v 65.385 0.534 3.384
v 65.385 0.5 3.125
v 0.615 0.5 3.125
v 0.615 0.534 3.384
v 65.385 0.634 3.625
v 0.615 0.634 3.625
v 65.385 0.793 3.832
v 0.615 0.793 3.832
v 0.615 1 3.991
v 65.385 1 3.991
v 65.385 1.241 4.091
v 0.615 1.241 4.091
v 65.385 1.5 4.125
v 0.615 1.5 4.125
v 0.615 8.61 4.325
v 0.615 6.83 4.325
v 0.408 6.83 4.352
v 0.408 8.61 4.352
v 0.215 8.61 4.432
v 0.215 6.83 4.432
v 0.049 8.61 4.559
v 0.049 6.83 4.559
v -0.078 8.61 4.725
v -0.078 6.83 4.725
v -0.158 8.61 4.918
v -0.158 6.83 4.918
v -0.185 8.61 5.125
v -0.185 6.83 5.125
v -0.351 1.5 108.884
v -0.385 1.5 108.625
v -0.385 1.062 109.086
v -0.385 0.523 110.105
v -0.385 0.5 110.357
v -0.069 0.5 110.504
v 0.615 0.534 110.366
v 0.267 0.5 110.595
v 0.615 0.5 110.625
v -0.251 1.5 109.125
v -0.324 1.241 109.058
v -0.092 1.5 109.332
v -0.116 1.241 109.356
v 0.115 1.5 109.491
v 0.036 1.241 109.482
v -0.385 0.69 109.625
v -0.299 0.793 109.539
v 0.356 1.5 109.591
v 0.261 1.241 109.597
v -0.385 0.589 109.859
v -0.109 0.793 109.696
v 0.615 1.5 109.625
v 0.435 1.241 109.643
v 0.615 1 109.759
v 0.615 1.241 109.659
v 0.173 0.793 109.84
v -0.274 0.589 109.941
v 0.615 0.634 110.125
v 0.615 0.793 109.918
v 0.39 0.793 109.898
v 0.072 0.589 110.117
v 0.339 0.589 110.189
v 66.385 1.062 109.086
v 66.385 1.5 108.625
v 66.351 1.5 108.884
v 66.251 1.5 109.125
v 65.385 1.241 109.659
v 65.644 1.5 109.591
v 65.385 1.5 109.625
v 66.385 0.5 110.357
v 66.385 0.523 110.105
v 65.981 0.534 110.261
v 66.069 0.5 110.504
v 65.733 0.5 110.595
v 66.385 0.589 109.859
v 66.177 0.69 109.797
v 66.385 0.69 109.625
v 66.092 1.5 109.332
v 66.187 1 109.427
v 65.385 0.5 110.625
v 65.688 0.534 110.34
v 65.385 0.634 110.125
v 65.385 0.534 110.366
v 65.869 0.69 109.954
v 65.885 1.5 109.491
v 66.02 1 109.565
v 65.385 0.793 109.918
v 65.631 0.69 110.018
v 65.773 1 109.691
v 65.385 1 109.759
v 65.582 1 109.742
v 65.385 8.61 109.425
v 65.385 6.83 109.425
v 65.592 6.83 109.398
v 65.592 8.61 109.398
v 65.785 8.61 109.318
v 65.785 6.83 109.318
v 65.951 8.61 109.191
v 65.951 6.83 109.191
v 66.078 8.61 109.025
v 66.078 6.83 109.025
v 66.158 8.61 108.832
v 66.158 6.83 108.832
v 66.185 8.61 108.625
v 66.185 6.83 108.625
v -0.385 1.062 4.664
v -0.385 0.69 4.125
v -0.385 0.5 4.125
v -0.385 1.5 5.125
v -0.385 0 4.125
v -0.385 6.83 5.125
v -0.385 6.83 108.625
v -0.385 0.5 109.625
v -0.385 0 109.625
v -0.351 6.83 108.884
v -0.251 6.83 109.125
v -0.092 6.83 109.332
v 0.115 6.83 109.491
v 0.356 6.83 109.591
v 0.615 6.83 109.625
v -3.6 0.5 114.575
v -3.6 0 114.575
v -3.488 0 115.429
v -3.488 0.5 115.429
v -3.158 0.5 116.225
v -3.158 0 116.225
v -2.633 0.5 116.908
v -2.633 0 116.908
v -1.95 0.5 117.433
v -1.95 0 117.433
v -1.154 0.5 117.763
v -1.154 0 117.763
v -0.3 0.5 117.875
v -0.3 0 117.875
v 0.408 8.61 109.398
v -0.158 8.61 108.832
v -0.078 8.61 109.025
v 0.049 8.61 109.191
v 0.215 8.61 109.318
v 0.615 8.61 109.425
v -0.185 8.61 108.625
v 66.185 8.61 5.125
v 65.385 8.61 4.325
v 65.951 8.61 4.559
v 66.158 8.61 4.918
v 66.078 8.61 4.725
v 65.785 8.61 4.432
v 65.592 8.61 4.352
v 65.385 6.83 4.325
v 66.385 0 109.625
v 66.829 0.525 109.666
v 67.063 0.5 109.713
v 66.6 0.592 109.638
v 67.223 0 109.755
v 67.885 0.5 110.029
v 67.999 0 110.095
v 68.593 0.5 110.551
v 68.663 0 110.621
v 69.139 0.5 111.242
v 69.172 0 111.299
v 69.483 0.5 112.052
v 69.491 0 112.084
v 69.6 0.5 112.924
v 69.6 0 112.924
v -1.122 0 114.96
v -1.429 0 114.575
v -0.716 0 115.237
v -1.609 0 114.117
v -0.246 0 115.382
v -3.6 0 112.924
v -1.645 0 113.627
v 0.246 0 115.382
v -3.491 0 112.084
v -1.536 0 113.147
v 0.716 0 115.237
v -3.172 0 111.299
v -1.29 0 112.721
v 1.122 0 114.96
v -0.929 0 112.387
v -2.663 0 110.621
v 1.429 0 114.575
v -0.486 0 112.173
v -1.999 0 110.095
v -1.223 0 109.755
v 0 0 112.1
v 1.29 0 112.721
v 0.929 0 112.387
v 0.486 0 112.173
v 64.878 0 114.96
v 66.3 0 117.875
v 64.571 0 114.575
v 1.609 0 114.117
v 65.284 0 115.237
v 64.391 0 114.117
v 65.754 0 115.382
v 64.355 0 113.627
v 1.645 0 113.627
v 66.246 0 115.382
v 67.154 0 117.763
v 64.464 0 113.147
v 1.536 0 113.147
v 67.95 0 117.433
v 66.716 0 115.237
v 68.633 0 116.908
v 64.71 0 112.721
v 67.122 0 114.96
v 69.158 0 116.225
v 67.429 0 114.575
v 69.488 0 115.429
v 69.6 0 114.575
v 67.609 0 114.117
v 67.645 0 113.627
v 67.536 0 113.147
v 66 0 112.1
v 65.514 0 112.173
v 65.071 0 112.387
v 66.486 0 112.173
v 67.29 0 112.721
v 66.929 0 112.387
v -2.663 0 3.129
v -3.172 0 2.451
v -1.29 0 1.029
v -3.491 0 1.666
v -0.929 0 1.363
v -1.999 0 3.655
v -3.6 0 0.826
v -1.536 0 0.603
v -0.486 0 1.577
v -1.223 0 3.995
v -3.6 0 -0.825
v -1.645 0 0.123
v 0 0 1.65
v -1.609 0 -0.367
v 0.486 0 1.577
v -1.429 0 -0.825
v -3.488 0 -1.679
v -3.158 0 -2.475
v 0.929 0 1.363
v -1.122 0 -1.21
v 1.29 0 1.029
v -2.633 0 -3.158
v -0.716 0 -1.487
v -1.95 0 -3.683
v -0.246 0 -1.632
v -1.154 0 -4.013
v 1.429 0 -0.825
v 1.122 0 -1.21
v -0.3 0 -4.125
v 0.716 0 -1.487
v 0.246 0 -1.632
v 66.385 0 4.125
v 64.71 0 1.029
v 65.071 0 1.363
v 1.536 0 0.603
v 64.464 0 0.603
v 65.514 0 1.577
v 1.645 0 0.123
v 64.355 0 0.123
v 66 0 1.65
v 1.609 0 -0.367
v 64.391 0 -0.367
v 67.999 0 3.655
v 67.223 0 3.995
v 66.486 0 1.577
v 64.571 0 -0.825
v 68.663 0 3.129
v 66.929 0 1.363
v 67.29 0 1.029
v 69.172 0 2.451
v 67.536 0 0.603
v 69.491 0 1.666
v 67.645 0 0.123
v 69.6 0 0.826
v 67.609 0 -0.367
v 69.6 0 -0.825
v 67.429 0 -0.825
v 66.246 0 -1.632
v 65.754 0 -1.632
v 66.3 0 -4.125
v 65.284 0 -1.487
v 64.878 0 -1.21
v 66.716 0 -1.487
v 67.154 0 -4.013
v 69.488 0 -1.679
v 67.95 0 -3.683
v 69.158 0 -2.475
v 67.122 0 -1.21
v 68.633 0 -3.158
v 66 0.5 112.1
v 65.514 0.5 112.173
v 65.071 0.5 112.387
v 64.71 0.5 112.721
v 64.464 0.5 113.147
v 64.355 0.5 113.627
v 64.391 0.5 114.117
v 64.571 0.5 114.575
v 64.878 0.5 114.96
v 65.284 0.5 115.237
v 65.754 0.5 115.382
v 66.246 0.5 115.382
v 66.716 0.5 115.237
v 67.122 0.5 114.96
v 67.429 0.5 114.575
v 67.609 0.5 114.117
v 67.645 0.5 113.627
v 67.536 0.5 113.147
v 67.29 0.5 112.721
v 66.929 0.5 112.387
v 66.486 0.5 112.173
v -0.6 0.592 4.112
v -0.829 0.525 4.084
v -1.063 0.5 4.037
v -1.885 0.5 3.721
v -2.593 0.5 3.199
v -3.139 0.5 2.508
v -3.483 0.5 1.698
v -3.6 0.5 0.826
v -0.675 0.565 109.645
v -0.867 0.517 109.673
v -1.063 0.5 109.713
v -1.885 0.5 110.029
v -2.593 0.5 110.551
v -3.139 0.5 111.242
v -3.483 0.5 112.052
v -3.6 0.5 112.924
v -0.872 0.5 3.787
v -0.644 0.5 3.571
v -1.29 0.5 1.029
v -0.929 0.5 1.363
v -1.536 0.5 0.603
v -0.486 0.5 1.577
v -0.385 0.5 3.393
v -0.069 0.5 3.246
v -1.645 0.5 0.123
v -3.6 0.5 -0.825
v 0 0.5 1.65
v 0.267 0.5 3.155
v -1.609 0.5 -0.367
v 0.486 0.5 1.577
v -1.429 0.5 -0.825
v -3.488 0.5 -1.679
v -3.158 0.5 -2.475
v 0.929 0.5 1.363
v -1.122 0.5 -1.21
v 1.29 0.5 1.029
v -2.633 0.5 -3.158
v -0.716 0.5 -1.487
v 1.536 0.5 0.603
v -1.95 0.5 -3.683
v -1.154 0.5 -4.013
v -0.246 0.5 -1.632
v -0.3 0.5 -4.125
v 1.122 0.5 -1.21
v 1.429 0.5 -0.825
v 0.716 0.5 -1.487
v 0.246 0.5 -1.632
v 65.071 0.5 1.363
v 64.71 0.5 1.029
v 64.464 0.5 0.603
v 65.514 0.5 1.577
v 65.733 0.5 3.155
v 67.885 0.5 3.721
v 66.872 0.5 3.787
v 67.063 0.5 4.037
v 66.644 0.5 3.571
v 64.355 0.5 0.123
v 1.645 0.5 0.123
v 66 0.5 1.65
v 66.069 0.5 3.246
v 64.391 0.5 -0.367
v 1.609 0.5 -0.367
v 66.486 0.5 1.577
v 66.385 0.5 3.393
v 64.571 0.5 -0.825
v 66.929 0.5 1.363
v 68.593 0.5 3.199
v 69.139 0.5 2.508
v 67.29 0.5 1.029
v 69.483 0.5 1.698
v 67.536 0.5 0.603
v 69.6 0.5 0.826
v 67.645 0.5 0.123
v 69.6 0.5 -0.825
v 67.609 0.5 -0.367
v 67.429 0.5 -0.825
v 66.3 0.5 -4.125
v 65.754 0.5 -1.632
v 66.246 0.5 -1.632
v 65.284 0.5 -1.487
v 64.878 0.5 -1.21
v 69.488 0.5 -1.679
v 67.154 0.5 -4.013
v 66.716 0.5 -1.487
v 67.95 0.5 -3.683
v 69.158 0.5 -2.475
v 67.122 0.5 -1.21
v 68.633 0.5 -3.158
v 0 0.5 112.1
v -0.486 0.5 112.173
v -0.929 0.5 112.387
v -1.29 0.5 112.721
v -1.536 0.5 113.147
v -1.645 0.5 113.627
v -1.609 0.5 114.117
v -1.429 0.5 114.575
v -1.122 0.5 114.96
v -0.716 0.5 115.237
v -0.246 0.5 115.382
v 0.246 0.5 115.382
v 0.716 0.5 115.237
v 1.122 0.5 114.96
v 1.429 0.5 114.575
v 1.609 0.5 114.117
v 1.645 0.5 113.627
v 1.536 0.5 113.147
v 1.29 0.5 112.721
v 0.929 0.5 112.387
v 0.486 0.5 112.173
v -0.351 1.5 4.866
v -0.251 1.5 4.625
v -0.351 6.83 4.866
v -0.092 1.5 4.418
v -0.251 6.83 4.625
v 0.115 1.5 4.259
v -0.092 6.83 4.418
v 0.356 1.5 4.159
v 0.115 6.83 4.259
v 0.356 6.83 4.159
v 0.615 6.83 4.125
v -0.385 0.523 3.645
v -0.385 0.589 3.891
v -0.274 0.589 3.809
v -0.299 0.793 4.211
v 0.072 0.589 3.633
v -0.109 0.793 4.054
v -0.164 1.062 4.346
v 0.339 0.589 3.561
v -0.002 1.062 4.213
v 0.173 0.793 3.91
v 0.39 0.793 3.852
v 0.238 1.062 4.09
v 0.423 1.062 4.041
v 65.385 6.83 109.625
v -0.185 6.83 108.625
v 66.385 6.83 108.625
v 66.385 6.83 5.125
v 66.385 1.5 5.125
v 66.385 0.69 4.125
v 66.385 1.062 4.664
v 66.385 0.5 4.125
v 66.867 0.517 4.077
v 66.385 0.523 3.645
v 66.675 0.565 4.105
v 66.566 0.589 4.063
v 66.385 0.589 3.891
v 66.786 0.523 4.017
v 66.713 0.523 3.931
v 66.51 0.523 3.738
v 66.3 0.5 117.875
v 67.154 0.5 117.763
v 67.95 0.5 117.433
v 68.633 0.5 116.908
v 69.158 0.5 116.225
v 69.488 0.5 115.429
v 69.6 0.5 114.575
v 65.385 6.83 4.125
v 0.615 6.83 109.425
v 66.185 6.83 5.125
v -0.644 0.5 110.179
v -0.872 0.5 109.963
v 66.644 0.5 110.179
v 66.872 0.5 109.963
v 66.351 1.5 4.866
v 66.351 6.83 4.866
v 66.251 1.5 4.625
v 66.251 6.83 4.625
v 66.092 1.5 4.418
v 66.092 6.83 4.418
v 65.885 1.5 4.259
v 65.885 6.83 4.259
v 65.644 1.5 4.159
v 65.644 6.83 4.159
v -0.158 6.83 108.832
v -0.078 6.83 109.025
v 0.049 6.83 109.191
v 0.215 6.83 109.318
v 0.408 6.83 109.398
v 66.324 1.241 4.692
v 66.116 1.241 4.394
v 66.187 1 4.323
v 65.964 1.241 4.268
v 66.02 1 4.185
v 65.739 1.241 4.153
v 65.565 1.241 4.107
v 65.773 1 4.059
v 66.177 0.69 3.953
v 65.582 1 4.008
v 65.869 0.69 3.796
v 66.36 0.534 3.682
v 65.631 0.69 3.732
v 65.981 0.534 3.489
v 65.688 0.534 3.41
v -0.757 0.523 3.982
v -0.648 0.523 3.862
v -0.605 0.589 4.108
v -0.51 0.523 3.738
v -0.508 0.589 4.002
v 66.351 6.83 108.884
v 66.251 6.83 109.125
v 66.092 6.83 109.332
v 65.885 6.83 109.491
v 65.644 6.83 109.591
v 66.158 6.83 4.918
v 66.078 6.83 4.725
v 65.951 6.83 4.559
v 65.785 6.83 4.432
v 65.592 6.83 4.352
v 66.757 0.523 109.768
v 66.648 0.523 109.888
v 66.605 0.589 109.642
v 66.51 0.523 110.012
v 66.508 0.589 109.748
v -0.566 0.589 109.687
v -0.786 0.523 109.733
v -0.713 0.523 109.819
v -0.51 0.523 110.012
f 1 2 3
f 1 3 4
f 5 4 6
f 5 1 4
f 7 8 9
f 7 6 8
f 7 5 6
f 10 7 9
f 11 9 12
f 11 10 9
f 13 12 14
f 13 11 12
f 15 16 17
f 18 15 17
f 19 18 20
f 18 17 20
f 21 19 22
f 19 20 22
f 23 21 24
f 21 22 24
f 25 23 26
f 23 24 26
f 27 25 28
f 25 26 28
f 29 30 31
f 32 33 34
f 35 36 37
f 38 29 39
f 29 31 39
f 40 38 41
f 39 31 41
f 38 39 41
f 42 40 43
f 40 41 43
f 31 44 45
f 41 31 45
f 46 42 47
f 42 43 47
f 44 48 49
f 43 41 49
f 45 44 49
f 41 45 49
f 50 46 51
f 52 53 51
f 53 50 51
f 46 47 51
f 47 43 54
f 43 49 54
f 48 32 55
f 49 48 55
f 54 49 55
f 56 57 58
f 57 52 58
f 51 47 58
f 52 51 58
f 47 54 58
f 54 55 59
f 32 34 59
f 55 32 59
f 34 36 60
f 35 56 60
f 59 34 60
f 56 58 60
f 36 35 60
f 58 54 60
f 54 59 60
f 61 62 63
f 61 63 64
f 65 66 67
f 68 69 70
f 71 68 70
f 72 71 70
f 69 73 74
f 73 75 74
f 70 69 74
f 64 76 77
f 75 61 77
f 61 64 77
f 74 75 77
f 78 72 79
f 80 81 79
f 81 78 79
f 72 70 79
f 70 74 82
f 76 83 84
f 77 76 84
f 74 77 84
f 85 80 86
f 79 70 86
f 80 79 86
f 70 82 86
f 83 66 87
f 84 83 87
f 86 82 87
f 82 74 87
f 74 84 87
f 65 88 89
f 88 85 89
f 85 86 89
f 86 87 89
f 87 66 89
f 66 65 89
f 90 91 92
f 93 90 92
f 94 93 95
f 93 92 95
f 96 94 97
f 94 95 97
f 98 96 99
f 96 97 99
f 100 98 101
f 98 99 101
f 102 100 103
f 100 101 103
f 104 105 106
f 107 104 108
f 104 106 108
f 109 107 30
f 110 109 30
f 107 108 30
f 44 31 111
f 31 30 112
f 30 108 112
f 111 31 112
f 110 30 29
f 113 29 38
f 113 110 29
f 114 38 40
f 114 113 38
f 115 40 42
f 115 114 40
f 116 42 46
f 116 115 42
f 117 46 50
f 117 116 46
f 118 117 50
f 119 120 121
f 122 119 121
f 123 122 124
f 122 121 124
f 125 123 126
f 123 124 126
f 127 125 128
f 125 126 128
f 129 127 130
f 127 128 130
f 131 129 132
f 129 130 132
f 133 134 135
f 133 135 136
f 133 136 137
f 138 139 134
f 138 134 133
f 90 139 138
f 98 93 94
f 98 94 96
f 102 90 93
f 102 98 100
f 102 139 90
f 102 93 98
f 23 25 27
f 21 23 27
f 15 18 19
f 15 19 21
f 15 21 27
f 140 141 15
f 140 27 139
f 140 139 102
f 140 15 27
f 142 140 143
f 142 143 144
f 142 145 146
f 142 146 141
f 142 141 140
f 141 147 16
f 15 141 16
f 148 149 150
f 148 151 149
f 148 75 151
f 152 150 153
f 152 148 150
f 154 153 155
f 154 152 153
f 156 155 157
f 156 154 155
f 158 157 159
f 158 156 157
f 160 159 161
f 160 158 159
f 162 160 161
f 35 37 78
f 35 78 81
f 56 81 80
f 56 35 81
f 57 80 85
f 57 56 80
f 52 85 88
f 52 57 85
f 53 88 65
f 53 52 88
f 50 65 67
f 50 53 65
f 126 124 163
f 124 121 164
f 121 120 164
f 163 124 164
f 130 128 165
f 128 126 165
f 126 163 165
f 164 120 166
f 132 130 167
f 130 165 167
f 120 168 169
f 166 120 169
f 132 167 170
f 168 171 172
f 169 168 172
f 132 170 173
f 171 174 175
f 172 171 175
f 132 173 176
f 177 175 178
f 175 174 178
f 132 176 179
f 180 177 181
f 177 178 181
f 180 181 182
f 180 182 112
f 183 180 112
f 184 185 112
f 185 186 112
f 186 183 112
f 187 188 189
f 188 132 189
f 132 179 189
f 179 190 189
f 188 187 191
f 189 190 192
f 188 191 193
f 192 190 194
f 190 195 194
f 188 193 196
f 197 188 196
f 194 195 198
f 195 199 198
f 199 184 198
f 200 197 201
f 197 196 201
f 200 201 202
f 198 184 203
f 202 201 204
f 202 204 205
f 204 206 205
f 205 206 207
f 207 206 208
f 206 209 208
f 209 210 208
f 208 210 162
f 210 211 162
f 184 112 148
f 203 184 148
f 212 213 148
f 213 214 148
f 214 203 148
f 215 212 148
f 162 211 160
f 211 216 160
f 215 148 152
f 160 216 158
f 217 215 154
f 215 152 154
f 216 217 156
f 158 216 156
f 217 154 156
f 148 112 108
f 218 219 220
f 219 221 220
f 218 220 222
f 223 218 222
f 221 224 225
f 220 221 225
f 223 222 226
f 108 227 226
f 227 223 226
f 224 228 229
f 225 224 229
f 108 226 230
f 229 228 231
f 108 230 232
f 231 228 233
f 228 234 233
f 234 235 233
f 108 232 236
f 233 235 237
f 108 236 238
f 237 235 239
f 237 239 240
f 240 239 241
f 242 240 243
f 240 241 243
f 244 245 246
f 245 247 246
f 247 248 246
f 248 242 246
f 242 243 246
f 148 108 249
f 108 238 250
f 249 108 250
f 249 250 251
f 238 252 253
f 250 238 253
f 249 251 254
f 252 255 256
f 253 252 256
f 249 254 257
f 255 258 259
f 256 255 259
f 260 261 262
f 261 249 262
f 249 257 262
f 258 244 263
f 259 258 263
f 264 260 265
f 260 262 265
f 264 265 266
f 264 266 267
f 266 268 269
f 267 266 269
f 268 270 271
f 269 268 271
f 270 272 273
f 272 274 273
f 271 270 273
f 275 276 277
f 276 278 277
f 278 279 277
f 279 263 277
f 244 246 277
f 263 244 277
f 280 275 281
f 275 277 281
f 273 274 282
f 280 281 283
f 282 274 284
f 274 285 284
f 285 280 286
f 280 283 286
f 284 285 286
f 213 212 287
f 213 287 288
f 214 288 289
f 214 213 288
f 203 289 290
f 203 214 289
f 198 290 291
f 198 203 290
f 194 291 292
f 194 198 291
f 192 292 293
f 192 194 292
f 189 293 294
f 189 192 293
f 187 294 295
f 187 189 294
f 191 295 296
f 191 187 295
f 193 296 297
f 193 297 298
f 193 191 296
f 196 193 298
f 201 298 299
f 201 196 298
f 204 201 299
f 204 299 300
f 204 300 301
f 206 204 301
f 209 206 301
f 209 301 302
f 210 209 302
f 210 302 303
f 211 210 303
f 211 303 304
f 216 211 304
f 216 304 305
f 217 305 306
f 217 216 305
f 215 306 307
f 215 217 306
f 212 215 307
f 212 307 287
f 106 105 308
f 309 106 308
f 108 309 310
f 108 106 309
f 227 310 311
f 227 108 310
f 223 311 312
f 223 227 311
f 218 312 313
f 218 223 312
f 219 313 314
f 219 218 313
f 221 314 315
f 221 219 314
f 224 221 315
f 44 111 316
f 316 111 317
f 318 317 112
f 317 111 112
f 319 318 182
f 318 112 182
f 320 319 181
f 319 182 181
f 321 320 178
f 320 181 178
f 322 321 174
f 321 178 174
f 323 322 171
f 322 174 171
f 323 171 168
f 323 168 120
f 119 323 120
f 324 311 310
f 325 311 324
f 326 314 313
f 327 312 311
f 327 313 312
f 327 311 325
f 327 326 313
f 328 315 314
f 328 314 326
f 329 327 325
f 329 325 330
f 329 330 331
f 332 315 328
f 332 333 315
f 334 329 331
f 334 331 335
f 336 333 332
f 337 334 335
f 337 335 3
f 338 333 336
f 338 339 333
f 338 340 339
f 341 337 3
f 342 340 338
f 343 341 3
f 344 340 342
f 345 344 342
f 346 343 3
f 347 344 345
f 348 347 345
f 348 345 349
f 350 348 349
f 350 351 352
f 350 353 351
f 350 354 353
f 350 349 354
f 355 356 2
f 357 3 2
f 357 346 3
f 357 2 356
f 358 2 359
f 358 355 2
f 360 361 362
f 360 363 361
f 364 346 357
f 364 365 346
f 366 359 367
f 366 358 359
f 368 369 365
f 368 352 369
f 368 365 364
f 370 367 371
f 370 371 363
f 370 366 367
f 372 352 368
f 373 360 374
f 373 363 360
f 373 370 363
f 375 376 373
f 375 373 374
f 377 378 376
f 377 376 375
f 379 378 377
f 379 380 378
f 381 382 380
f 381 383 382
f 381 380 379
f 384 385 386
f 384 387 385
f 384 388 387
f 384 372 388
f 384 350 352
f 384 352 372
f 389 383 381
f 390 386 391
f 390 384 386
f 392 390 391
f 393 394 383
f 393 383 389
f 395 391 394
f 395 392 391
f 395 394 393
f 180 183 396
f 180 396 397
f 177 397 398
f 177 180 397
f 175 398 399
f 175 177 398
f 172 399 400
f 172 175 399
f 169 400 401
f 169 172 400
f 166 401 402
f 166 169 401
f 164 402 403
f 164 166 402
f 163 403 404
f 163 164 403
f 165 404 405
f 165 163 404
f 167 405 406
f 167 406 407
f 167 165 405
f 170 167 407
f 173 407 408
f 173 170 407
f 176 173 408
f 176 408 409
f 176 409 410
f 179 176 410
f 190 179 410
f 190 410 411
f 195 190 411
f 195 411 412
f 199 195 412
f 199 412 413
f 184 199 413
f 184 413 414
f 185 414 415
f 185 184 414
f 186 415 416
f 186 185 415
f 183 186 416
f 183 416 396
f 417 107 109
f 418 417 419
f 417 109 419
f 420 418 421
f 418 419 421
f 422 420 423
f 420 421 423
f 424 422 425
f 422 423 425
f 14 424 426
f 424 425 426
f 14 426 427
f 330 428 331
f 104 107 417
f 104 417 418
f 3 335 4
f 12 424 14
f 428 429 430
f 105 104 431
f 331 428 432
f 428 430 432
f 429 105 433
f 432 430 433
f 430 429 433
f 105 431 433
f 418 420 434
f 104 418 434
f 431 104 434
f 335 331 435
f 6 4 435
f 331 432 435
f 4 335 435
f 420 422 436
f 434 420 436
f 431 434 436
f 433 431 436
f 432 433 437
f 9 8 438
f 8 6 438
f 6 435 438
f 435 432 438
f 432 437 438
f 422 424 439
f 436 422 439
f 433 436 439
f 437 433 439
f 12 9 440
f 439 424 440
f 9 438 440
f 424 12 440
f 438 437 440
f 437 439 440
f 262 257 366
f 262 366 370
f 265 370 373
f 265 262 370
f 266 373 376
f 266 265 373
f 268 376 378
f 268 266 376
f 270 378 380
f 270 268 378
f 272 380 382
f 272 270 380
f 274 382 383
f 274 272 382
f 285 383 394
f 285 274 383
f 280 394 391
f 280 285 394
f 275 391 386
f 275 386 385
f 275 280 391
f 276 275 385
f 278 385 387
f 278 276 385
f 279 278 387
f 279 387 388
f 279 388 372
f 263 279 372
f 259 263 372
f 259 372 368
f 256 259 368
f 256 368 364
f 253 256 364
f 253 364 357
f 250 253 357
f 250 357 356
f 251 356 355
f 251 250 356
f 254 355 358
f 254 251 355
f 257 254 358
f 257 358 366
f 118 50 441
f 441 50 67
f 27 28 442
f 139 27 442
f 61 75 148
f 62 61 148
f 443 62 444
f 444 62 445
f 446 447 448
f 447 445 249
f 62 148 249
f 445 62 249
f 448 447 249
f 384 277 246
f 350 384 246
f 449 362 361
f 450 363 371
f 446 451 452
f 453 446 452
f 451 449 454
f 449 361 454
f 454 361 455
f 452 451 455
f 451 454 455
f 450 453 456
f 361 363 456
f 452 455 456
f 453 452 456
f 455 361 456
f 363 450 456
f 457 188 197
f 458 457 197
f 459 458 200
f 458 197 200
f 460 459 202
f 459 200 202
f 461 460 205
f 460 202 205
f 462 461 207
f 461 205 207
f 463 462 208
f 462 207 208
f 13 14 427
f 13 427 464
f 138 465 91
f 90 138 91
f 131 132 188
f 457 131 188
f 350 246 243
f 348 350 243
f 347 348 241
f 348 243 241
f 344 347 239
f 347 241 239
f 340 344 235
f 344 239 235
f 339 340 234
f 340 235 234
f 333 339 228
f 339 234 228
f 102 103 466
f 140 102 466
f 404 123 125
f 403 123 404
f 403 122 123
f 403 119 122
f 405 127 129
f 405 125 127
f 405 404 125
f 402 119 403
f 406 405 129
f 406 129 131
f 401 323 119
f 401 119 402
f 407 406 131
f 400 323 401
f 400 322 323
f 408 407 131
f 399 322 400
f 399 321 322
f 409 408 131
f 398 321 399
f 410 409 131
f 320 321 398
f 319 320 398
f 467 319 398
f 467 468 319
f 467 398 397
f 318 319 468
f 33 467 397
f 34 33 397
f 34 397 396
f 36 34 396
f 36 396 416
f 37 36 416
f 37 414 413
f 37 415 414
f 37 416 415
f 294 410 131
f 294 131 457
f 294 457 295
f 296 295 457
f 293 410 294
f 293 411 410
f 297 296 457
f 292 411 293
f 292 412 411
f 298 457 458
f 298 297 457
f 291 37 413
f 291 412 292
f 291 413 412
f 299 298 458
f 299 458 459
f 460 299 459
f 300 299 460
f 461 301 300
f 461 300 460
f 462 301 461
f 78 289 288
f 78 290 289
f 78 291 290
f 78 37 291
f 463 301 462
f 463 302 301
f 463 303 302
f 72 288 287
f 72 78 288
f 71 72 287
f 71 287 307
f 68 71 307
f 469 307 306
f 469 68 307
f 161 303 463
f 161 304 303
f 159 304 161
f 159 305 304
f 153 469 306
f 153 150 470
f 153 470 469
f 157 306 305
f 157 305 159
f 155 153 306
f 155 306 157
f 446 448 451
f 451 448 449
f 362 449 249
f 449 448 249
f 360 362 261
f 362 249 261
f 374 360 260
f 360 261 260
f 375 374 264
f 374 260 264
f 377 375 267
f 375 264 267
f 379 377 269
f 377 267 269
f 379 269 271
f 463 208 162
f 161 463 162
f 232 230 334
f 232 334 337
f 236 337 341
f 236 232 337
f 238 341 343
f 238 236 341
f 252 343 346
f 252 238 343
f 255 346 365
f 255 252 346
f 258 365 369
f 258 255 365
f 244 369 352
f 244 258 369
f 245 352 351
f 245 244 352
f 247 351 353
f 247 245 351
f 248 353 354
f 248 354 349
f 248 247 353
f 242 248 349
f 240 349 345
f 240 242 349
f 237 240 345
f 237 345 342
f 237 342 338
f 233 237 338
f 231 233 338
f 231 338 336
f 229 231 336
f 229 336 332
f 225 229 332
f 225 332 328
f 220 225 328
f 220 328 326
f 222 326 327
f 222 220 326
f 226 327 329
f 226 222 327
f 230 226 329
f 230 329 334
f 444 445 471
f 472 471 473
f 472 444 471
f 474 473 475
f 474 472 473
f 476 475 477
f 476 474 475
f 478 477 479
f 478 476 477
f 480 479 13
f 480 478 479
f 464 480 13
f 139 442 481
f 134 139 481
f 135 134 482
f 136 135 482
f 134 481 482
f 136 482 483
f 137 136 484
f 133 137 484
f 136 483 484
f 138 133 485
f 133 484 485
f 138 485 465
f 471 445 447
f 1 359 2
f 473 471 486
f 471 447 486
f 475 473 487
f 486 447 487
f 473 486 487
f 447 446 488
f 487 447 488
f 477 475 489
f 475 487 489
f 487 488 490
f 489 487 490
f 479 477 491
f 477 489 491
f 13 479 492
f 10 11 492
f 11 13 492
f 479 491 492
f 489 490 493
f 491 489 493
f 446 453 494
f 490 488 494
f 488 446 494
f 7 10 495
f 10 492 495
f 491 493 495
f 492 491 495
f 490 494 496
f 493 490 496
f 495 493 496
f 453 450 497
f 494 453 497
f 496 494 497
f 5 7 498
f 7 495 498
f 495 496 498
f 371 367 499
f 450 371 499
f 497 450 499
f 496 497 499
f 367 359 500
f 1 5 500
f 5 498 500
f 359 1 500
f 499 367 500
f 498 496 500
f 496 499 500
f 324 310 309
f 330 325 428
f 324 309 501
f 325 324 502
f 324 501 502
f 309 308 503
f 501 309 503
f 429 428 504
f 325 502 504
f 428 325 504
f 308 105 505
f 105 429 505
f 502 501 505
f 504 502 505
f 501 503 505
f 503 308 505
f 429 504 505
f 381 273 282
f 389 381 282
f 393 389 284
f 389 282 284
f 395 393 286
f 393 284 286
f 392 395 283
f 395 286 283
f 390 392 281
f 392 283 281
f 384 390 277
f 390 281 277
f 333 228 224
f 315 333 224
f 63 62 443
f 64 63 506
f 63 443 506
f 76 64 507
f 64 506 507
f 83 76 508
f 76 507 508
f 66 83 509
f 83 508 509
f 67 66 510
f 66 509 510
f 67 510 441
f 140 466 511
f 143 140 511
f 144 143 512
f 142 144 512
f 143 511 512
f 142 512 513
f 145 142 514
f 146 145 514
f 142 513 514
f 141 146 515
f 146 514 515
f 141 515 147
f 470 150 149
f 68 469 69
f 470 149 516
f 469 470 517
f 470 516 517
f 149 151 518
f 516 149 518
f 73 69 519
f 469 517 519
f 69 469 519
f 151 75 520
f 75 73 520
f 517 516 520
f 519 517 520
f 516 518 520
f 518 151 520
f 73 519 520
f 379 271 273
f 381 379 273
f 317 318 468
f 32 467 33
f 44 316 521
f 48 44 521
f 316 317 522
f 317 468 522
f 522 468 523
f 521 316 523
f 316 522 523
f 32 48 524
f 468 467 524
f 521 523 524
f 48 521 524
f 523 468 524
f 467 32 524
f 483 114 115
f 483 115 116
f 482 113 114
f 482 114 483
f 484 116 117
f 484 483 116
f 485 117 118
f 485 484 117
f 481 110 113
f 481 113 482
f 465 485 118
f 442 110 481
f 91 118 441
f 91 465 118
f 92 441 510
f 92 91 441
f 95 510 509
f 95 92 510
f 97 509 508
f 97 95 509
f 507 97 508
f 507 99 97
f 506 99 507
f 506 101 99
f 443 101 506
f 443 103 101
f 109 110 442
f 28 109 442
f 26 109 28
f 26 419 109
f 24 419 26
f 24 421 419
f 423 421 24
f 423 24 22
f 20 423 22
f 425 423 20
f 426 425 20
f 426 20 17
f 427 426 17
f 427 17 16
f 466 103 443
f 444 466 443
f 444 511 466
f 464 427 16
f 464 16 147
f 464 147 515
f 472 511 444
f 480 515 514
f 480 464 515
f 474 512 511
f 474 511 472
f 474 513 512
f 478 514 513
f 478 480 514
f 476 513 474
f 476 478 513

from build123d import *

# Parameters (mm, degrees)
SKETCH_1_R      = 1.65
EXTRUDE_1_DEPTH = 0.5
FILLET_1_R      = 3.3
SKETCH_2_W      = 66.770552446
SKETCH_2_H      = 105.5
EXTRUDE_2_DEPTH = 6.83
FILLET_2_R      = 1
EXTRUDE_3_DEPTH = 1.78
FILLET_3_R      = 1


with BuildPart() as part:
    # 草图1 → 凸台-拉伸1 (new body)
    with BuildSketch(Plane(origin=(0, 0, 0), x_dir=(1, 0, 0), z_dir=(0, 1, 0))):
        Polygon((66.385276223, -4.125), (69.6, -4.125), (69.6, 4.125), (-3.6, 4.125), (-3.6, -4.125), (-0.385276223, -4.125), (-0.385276223, -109.625), (-3.6, -109.625), (-3.6, -117.875), (69.6, -117.875), (69.6, -109.625), (66.385276223, -109.625), align=None)
        with Locations(Location((0, 0, 0), (0, 0, 270))):
            Circle(SKETCH_1_R, mode=Mode.SUBTRACT)
        with Locations(Location((66, 0, 0), (0, 0, 270))):
            Circle(SKETCH_1_R, mode=Mode.SUBTRACT)
        with Locations(Location((66, -113.75, 0), (0, 0, 90))):
            Circle(SKETCH_1_R, mode=Mode.SUBTRACT)
        with Locations(Location((0, -113.75, 0), (0, 0, 90))):
            Circle(SKETCH_1_R, mode=Mode.SUBTRACT)
    extrude(amount=EXTRUDE_1_DEPTH)

    # 圆角1
    # the kernel refuses this fillet: 3.3 mm, written as the material it takes off along each edge
    with BuildSketch(Plane(origin=(69.6, -8.247244982, 109.625), x_dir=(0, 0, 1), z_dir=(0, 1, 0)), Plane(origin=(-3.6, -8.247244982, 4.125), x_dir=(0, 0, -1), z_dir=(0, 1, 0))) as fillet_1_piece_1:
        with BuildLine():
            CenterArc((3.298897993, -3.3), FILLET_1_R, 90, 88.519238897)
            Line((0, -3.214723777), (-0.06597796, -3.213018252))
            ThreePointArc((-0.06597796, -3.213018252), (-0.066, -1.607361888), (-0.066, 0))
            Line((-0.066, 0), (0, 0.066))
            Line((0, 0.066), (3.298897993, 0.066))
            Line((3.298897993, 0.066), (3.298897993, 0))
        make_face()
    extrude(amount=16.994489963, mode=Mode.SUBTRACT)
    with BuildSketch(Plane(origin=(69.6, -8.25, 117.875), x_dir=(-1, 0, 0), z_dir=(0, 1, 0)), Plane(origin=(-3.6, -8.25, 117.875), x_dir=(0, 0, -1), z_dir=(0, 1, 0)), Plane(origin=(-3.6, -8.25, -4.125), x_dir=(1, 0, 0), z_dir=(0, 1, 0)), Plane(origin=(69.6, -8.25, -4.125), x_dir=(0, 0, 1), z_dir=(0, 1, 0))) as fillet_1_piece_2:
        with BuildLine():
            CenterArc((FILLET_1_R, -FILLET_1_R), FILLET_1_R, 90, 90)
            Line((0, -FILLET_1_R), (-FILLET_1_R * 0.02, -FILLET_1_R))
            Line((-FILLET_1_R * 0.02, -FILLET_1_R), (-FILLET_1_R * 0.02, FILLET_1_R * 0.02))
            Line((-FILLET_1_R * 0.02, FILLET_1_R * 0.02), (FILLET_1_R, FILLET_1_R * 0.02))
            Line((FILLET_1_R, FILLET_1_R * 0.02), (FILLET_1_R, 0))
        make_face()
    extrude(amount=17, mode=Mode.SUBTRACT)
    with BuildSketch(Plane(origin=(-3.6, -8.247244982, 109.625), x_dir=(1, 0, 0), z_dir=(0, 1, 0)), Plane(origin=(69.6, -8.247244982, 4.125), x_dir=(-1, 0, 0), z_dir=(0, 1, 0))) as fillet_1_piece_3:
        with BuildLine():
            CenterArc((3.3, -3.298897993), FILLET_1_R, 91.480761103, 88.519238897)
            Line((0, -3.298897993), (-0.066, -3.298897993))
            Line((-0.066, -3.298897993), (-0.066, 0))
            Line((-0.066, 0), (0, 0.066))
            ThreePointArc((0, 0.066), (1.607361888, 0.066), (3.213018252, 0.06597796))
            Line((3.213018252, 0.06597796), (3.214723777, 0))
        make_face()
    extrude(amount=16.994489963, mode=Mode.SUBTRACT)

    # 草图2 → 凸台-拉伸2 (add)
    with BuildSketch(Plane(origin=(0, 0, 0), x_dir=(1, 0, 0), z_dir=(0, 1, 0))):
        with Locations((33, -56.875)):
            Rectangle(SKETCH_2_W, SKETCH_2_H)
    extrude(amount=EXTRUDE_2_DEPTH)

    # 圆角2
    fillet_2_edges = [part.edges().sort_by_distance(p)[0] for p in [
        (-0.385276223, 3.665, 4.125),
        (-0.385276223, 3.665, 109.625),
        (66.385276223, 3.665, 109.625),
        (66.385276223, 3.665, 4.125),
    ]]
    fillet(fillet_2_edges, radius=FILLET_2_R)

    # 草图3 → 凸台-拉伸3 (add)
    with BuildSketch(Plane(origin=(0, 6.83, 0), x_dir=(1, 0, 0), z_dir=(0, 1, 0))):
        with BuildLine():
            Line((66.185276223, -108.625), (66.185276223, -5.125))
            ThreePointArc((66.185276223, -5.125), (65.950961648, -4.559314575), (65.385276223, -4.325))
            Line((65.385276223, -4.325), (0.614723777, -4.325))
            ThreePointArc((0.614723777, -4.325), (0.049038352, -4.559314575), (-0.185276223, -5.125))
            Line((-0.185276223, -5.125), (-0.185276223, -108.625))
            ThreePointArc((-0.185276223, -108.625), (0.049038352, -109.190685425), (0.614723777, -109.425))
            Line((0.614723777, -109.425), (65.385276223, -109.425))
            ThreePointArc((65.385276223, -109.425), (65.950961648, -109.190685425), (66.185276223, -108.625))
        make_face()
    extrude(amount=EXTRUDE_3_DEPTH)

    # 圆角3
    # the kernel refuses this fillet: 1 mm, written as the material it adds along each edge
    with BuildSketch(Plane(origin=(65.385276223, 0.5, 108.625), x_dir=(-0.8017442392976621, 0, -0.5976672776328089), z_dir=(-0.5976672776328089, 0, 0.8017442392976621))) as fillet_3_piece_1_section:
        with BuildLine():
            CenterArc((1 + FILLET_3_R, -FILLET_3_R), FILLET_3_R, 90, 90)
            Line((1 + FILLET_3_R, 0), (1, 0))
            Line((1, 0), (1, -FILLET_3_R))
        make_face()
    fillet_3_piece_1 = revolve(axis=Axis((65.385276223, 0.5, 108.625), (0, -1, 0)), revolution_arc=233.296989237, mode=Mode.PRIVATE)
    fillet_3_piece_1 = split(fillet_3_piece_1, bisect_by=Plane(origin=(66.385276223, 0.811675846, 109.374877518), z_dir=(-1, 0, 0)), keep=Keep.TOP, mode=Mode.PRIVATE)
    add(fillet_3_piece_1)
    with BuildSketch(Plane(origin=(65.385276223, 0.5, 108.625), x_dir=(-0.8017442392976621, 0, -0.5976672776328089), z_dir=(-0.5976672776328089, 0, 0.8017442392976621))) as fillet_3_piece_2_section:
        with BuildLine():
            CenterArc((1 + FILLET_3_R, -FILLET_3_R), FILLET_3_R, 90, 90)
            Line((1 + FILLET_3_R, 0), (1, 0))
            Line((1, 0), (1, -FILLET_3_R))
        make_face()
    fillet_3_piece_2 = revolve(axis=Axis((65.385276223, 0.5, 108.625), (0, -1, 0)), revolution_arc=233.296989237, mode=Mode.PRIVATE)
    fillet_3_piece_2 = fillet_3_piece_2 & Plane(origin=(66.3, 0.537437966, 112.923897993), x_dir=(0, 0, 1), z_dir=(0, -1, 0)) * Cylinder(3.3, 8, mode=Mode.PRIVATE)
    add(fillet_3_piece_2)
    with BuildSketch(Plane(origin=(0.614723777, 0.5, 108.625), x_dir=(0.8017442392976509, 0, -0.597667277632824), z_dir=(0.597667277632824, 0, 0.8017442392976509))) as fillet_3_piece_3_section:
        with BuildLine():
            CenterArc((1 + FILLET_3_R, FILLET_3_R), FILLET_3_R, 180, 90)
            Line((1, FILLET_3_R), (1, 0))
            Line((1, 0), (1 + FILLET_3_R, 0))
        make_face()
    fillet_3_piece_3 = revolve(axis=Axis((0.614723777, 0.5, 108.625), (0, 1, 0)), revolution_arc=233.296989237, mode=Mode.PRIVATE)
    fillet_3_piece_3 = split(fillet_3_piece_3, bisect_by=Plane(origin=(-0.385276223, 0.811675592, 109.374877608), z_dir=(1, 0, 0)), keep=Keep.TOP, mode=Mode.PRIVATE)
    add(fillet_3_piece_3)
    with BuildSketch(Plane(origin=(0.614723777, 0.5, 108.625), x_dir=(0.8017442392976509, 0, -0.597667277632824), z_dir=(0.597667277632824, 0, 0.8017442392976509))) as fillet_3_piece_4_section:
        with BuildLine():
            CenterArc((1 + FILLET_3_R, FILLET_3_R), FILLET_3_R, 180, 90)
            Line((1, FILLET_3_R), (1, 0))
            Line((1, 0), (1 + FILLET_3_R, 0))
        make_face()
    fillet_3_piece_4 = revolve(axis=Axis((0.614723777, 0.5, 108.625), (0, 1, 0)), revolution_arc=233.296989237, mode=Mode.PRIVATE)
    fillet_3_piece_4 = fillet_3_piece_4 & Plane(origin=(-0.3, 0.537437971, 112.923897993), x_dir=(1, 0, 0), z_dir=(0, -1, 0)) * Cylinder(3.3, 8, mode=Mode.PRIVATE)
    add(fillet_3_piece_4)
    with BuildSketch(Plane(origin=(0.614723777, 0.5, 5.125), x_dir=(0.8017442392976485, 0, 0.5976672776328273), z_dir=(0.5976672776328273, 0, -0.8017442392976485))) as fillet_3_piece_5_section:
        with BuildLine():
            CenterArc((1 + FILLET_3_R, -FILLET_3_R), FILLET_3_R, 90, 90)
            Line((1, -FILLET_3_R), (1, 0))
            Line((1, 0), (1 + FILLET_3_R, 0))
        make_face()
    fillet_3_piece_5 = revolve(axis=Axis((0.614723777, 0.5, 5.125), (0, -1, 0)), revolution_arc=233.296989237, mode=Mode.PRIVATE)
    fillet_3_piece_5 = split(fillet_3_piece_5, bisect_by=Plane(origin=(-0.385276223, 0.811675846, 4.375122482), z_dir=(1, 0, 0)), keep=Keep.TOP, mode=Mode.PRIVATE)
    add(fillet_3_piece_5)
    with BuildSketch(Plane(origin=(0.614723777, 0.5, 5.125), x_dir=(0.8017442392976485, 0, 0.5976672776328273), z_dir=(0.5976672776328273, 0, -0.8017442392976485))) as fillet_3_piece_6_section:
        with BuildLine():
            CenterArc((1 + FILLET_3_R, -FILLET_3_R), FILLET_3_R, 90, 90)
            Line((1, -FILLET_3_R), (1, 0))
            Line((1, 0), (1 + FILLET_3_R, 0))
        make_face()
    fillet_3_piece_6 = revolve(axis=Axis((0.614723777, 0.5, 5.125), (0, -1, 0)), revolution_arc=233.296989237, mode=Mode.PRIVATE)
    fillet_3_piece_6 = fillet_3_piece_6 & Plane(origin=(-0.3, 0.537437966, 0.826102007), x_dir=(0, 0, -1), z_dir=(0, -1, 0)) * Cylinder(3.3, 8, mode=Mode.PRIVATE)
    add(fillet_3_piece_6)
    with BuildSketch(Plane(origin=(65.385276223, 0.5, 5.125), x_dir=(-0.801744239297651, 0, 0.5976672776328237), z_dir=(-0.5976672776328237, 0, -0.801744239297651))) as fillet_3_piece_7_section:
        with BuildLine():
            CenterArc((1 + FILLET_3_R, FILLET_3_R), FILLET_3_R, 180, 90)
            Line((1 + FILLET_3_R, 0), (1, 0))
            Line((1, 0), (1, FILLET_3_R))
        make_face()
    fillet_3_piece_7 = revolve(axis=Axis((65.385276223, 0.5, 5.125), (0, 1, 0)), revolution_arc=233.296989237, mode=Mode.PRIVATE)
    fillet_3_piece_7 = split(fillet_3_piece_7, bisect_by=Plane(origin=(66.385276223, 0.811675555, 4.375122379), z_dir=(-1, 0, 0)), keep=Keep.TOP, mode=Mode.PRIVATE)
    add(fillet_3_piece_7)
    with BuildSketch(Plane(origin=(65.385276223, 0.5, 5.125), x_dir=(-0.801744239297651, 0, 0.5976672776328237), z_dir=(-0.5976672776328237, 0, -0.801744239297651))) as fillet_3_piece_8_section:
        with BuildLine():
            CenterArc((1 + FILLET_3_R, FILLET_3_R), FILLET_3_R, 180, 90)
            Line((1 + FILLET_3_R, 0), (1, 0))
            Line((1, 0), (1, FILLET_3_R))
        make_face()
    fillet_3_piece_8 = revolve(axis=Axis((65.385276223, 0.5, 5.125), (0, 1, 0)), revolution_arc=233.296989237, mode=Mode.PRIVATE)
    fillet_3_piece_8 = fillet_3_piece_8 & Plane(origin=(66.3, 0.537437971, 0.826102007), x_dir=(-1, 0, 0), z_dir=(0, -1, 0)) * Cylinder(3.3, 8, mode=Mode.PRIVATE)
    add(fillet_3_piece_8)
    with BuildSketch(Plane(origin=(0.614723777, 0.5, 109.625), x_dir=(0, 0, 1), z_dir=(1, 0, 0)), Plane(origin=(65.385276223, 0.5, 4.125), x_dir=(0, 0, -1), z_dir=(-1, 0, 0))) as fillet_3_piece_9:
        with BuildLine():
            CenterArc((FILLET_3_R, -FILLET_3_R), FILLET_3_R, 90, 90)
            Line((0, -FILLET_3_R), (0, 0))
            Line((0, 0), (FILLET_3_R, 0))
        make_face()
    extrude(amount=64.770552447)


solid = part.part
